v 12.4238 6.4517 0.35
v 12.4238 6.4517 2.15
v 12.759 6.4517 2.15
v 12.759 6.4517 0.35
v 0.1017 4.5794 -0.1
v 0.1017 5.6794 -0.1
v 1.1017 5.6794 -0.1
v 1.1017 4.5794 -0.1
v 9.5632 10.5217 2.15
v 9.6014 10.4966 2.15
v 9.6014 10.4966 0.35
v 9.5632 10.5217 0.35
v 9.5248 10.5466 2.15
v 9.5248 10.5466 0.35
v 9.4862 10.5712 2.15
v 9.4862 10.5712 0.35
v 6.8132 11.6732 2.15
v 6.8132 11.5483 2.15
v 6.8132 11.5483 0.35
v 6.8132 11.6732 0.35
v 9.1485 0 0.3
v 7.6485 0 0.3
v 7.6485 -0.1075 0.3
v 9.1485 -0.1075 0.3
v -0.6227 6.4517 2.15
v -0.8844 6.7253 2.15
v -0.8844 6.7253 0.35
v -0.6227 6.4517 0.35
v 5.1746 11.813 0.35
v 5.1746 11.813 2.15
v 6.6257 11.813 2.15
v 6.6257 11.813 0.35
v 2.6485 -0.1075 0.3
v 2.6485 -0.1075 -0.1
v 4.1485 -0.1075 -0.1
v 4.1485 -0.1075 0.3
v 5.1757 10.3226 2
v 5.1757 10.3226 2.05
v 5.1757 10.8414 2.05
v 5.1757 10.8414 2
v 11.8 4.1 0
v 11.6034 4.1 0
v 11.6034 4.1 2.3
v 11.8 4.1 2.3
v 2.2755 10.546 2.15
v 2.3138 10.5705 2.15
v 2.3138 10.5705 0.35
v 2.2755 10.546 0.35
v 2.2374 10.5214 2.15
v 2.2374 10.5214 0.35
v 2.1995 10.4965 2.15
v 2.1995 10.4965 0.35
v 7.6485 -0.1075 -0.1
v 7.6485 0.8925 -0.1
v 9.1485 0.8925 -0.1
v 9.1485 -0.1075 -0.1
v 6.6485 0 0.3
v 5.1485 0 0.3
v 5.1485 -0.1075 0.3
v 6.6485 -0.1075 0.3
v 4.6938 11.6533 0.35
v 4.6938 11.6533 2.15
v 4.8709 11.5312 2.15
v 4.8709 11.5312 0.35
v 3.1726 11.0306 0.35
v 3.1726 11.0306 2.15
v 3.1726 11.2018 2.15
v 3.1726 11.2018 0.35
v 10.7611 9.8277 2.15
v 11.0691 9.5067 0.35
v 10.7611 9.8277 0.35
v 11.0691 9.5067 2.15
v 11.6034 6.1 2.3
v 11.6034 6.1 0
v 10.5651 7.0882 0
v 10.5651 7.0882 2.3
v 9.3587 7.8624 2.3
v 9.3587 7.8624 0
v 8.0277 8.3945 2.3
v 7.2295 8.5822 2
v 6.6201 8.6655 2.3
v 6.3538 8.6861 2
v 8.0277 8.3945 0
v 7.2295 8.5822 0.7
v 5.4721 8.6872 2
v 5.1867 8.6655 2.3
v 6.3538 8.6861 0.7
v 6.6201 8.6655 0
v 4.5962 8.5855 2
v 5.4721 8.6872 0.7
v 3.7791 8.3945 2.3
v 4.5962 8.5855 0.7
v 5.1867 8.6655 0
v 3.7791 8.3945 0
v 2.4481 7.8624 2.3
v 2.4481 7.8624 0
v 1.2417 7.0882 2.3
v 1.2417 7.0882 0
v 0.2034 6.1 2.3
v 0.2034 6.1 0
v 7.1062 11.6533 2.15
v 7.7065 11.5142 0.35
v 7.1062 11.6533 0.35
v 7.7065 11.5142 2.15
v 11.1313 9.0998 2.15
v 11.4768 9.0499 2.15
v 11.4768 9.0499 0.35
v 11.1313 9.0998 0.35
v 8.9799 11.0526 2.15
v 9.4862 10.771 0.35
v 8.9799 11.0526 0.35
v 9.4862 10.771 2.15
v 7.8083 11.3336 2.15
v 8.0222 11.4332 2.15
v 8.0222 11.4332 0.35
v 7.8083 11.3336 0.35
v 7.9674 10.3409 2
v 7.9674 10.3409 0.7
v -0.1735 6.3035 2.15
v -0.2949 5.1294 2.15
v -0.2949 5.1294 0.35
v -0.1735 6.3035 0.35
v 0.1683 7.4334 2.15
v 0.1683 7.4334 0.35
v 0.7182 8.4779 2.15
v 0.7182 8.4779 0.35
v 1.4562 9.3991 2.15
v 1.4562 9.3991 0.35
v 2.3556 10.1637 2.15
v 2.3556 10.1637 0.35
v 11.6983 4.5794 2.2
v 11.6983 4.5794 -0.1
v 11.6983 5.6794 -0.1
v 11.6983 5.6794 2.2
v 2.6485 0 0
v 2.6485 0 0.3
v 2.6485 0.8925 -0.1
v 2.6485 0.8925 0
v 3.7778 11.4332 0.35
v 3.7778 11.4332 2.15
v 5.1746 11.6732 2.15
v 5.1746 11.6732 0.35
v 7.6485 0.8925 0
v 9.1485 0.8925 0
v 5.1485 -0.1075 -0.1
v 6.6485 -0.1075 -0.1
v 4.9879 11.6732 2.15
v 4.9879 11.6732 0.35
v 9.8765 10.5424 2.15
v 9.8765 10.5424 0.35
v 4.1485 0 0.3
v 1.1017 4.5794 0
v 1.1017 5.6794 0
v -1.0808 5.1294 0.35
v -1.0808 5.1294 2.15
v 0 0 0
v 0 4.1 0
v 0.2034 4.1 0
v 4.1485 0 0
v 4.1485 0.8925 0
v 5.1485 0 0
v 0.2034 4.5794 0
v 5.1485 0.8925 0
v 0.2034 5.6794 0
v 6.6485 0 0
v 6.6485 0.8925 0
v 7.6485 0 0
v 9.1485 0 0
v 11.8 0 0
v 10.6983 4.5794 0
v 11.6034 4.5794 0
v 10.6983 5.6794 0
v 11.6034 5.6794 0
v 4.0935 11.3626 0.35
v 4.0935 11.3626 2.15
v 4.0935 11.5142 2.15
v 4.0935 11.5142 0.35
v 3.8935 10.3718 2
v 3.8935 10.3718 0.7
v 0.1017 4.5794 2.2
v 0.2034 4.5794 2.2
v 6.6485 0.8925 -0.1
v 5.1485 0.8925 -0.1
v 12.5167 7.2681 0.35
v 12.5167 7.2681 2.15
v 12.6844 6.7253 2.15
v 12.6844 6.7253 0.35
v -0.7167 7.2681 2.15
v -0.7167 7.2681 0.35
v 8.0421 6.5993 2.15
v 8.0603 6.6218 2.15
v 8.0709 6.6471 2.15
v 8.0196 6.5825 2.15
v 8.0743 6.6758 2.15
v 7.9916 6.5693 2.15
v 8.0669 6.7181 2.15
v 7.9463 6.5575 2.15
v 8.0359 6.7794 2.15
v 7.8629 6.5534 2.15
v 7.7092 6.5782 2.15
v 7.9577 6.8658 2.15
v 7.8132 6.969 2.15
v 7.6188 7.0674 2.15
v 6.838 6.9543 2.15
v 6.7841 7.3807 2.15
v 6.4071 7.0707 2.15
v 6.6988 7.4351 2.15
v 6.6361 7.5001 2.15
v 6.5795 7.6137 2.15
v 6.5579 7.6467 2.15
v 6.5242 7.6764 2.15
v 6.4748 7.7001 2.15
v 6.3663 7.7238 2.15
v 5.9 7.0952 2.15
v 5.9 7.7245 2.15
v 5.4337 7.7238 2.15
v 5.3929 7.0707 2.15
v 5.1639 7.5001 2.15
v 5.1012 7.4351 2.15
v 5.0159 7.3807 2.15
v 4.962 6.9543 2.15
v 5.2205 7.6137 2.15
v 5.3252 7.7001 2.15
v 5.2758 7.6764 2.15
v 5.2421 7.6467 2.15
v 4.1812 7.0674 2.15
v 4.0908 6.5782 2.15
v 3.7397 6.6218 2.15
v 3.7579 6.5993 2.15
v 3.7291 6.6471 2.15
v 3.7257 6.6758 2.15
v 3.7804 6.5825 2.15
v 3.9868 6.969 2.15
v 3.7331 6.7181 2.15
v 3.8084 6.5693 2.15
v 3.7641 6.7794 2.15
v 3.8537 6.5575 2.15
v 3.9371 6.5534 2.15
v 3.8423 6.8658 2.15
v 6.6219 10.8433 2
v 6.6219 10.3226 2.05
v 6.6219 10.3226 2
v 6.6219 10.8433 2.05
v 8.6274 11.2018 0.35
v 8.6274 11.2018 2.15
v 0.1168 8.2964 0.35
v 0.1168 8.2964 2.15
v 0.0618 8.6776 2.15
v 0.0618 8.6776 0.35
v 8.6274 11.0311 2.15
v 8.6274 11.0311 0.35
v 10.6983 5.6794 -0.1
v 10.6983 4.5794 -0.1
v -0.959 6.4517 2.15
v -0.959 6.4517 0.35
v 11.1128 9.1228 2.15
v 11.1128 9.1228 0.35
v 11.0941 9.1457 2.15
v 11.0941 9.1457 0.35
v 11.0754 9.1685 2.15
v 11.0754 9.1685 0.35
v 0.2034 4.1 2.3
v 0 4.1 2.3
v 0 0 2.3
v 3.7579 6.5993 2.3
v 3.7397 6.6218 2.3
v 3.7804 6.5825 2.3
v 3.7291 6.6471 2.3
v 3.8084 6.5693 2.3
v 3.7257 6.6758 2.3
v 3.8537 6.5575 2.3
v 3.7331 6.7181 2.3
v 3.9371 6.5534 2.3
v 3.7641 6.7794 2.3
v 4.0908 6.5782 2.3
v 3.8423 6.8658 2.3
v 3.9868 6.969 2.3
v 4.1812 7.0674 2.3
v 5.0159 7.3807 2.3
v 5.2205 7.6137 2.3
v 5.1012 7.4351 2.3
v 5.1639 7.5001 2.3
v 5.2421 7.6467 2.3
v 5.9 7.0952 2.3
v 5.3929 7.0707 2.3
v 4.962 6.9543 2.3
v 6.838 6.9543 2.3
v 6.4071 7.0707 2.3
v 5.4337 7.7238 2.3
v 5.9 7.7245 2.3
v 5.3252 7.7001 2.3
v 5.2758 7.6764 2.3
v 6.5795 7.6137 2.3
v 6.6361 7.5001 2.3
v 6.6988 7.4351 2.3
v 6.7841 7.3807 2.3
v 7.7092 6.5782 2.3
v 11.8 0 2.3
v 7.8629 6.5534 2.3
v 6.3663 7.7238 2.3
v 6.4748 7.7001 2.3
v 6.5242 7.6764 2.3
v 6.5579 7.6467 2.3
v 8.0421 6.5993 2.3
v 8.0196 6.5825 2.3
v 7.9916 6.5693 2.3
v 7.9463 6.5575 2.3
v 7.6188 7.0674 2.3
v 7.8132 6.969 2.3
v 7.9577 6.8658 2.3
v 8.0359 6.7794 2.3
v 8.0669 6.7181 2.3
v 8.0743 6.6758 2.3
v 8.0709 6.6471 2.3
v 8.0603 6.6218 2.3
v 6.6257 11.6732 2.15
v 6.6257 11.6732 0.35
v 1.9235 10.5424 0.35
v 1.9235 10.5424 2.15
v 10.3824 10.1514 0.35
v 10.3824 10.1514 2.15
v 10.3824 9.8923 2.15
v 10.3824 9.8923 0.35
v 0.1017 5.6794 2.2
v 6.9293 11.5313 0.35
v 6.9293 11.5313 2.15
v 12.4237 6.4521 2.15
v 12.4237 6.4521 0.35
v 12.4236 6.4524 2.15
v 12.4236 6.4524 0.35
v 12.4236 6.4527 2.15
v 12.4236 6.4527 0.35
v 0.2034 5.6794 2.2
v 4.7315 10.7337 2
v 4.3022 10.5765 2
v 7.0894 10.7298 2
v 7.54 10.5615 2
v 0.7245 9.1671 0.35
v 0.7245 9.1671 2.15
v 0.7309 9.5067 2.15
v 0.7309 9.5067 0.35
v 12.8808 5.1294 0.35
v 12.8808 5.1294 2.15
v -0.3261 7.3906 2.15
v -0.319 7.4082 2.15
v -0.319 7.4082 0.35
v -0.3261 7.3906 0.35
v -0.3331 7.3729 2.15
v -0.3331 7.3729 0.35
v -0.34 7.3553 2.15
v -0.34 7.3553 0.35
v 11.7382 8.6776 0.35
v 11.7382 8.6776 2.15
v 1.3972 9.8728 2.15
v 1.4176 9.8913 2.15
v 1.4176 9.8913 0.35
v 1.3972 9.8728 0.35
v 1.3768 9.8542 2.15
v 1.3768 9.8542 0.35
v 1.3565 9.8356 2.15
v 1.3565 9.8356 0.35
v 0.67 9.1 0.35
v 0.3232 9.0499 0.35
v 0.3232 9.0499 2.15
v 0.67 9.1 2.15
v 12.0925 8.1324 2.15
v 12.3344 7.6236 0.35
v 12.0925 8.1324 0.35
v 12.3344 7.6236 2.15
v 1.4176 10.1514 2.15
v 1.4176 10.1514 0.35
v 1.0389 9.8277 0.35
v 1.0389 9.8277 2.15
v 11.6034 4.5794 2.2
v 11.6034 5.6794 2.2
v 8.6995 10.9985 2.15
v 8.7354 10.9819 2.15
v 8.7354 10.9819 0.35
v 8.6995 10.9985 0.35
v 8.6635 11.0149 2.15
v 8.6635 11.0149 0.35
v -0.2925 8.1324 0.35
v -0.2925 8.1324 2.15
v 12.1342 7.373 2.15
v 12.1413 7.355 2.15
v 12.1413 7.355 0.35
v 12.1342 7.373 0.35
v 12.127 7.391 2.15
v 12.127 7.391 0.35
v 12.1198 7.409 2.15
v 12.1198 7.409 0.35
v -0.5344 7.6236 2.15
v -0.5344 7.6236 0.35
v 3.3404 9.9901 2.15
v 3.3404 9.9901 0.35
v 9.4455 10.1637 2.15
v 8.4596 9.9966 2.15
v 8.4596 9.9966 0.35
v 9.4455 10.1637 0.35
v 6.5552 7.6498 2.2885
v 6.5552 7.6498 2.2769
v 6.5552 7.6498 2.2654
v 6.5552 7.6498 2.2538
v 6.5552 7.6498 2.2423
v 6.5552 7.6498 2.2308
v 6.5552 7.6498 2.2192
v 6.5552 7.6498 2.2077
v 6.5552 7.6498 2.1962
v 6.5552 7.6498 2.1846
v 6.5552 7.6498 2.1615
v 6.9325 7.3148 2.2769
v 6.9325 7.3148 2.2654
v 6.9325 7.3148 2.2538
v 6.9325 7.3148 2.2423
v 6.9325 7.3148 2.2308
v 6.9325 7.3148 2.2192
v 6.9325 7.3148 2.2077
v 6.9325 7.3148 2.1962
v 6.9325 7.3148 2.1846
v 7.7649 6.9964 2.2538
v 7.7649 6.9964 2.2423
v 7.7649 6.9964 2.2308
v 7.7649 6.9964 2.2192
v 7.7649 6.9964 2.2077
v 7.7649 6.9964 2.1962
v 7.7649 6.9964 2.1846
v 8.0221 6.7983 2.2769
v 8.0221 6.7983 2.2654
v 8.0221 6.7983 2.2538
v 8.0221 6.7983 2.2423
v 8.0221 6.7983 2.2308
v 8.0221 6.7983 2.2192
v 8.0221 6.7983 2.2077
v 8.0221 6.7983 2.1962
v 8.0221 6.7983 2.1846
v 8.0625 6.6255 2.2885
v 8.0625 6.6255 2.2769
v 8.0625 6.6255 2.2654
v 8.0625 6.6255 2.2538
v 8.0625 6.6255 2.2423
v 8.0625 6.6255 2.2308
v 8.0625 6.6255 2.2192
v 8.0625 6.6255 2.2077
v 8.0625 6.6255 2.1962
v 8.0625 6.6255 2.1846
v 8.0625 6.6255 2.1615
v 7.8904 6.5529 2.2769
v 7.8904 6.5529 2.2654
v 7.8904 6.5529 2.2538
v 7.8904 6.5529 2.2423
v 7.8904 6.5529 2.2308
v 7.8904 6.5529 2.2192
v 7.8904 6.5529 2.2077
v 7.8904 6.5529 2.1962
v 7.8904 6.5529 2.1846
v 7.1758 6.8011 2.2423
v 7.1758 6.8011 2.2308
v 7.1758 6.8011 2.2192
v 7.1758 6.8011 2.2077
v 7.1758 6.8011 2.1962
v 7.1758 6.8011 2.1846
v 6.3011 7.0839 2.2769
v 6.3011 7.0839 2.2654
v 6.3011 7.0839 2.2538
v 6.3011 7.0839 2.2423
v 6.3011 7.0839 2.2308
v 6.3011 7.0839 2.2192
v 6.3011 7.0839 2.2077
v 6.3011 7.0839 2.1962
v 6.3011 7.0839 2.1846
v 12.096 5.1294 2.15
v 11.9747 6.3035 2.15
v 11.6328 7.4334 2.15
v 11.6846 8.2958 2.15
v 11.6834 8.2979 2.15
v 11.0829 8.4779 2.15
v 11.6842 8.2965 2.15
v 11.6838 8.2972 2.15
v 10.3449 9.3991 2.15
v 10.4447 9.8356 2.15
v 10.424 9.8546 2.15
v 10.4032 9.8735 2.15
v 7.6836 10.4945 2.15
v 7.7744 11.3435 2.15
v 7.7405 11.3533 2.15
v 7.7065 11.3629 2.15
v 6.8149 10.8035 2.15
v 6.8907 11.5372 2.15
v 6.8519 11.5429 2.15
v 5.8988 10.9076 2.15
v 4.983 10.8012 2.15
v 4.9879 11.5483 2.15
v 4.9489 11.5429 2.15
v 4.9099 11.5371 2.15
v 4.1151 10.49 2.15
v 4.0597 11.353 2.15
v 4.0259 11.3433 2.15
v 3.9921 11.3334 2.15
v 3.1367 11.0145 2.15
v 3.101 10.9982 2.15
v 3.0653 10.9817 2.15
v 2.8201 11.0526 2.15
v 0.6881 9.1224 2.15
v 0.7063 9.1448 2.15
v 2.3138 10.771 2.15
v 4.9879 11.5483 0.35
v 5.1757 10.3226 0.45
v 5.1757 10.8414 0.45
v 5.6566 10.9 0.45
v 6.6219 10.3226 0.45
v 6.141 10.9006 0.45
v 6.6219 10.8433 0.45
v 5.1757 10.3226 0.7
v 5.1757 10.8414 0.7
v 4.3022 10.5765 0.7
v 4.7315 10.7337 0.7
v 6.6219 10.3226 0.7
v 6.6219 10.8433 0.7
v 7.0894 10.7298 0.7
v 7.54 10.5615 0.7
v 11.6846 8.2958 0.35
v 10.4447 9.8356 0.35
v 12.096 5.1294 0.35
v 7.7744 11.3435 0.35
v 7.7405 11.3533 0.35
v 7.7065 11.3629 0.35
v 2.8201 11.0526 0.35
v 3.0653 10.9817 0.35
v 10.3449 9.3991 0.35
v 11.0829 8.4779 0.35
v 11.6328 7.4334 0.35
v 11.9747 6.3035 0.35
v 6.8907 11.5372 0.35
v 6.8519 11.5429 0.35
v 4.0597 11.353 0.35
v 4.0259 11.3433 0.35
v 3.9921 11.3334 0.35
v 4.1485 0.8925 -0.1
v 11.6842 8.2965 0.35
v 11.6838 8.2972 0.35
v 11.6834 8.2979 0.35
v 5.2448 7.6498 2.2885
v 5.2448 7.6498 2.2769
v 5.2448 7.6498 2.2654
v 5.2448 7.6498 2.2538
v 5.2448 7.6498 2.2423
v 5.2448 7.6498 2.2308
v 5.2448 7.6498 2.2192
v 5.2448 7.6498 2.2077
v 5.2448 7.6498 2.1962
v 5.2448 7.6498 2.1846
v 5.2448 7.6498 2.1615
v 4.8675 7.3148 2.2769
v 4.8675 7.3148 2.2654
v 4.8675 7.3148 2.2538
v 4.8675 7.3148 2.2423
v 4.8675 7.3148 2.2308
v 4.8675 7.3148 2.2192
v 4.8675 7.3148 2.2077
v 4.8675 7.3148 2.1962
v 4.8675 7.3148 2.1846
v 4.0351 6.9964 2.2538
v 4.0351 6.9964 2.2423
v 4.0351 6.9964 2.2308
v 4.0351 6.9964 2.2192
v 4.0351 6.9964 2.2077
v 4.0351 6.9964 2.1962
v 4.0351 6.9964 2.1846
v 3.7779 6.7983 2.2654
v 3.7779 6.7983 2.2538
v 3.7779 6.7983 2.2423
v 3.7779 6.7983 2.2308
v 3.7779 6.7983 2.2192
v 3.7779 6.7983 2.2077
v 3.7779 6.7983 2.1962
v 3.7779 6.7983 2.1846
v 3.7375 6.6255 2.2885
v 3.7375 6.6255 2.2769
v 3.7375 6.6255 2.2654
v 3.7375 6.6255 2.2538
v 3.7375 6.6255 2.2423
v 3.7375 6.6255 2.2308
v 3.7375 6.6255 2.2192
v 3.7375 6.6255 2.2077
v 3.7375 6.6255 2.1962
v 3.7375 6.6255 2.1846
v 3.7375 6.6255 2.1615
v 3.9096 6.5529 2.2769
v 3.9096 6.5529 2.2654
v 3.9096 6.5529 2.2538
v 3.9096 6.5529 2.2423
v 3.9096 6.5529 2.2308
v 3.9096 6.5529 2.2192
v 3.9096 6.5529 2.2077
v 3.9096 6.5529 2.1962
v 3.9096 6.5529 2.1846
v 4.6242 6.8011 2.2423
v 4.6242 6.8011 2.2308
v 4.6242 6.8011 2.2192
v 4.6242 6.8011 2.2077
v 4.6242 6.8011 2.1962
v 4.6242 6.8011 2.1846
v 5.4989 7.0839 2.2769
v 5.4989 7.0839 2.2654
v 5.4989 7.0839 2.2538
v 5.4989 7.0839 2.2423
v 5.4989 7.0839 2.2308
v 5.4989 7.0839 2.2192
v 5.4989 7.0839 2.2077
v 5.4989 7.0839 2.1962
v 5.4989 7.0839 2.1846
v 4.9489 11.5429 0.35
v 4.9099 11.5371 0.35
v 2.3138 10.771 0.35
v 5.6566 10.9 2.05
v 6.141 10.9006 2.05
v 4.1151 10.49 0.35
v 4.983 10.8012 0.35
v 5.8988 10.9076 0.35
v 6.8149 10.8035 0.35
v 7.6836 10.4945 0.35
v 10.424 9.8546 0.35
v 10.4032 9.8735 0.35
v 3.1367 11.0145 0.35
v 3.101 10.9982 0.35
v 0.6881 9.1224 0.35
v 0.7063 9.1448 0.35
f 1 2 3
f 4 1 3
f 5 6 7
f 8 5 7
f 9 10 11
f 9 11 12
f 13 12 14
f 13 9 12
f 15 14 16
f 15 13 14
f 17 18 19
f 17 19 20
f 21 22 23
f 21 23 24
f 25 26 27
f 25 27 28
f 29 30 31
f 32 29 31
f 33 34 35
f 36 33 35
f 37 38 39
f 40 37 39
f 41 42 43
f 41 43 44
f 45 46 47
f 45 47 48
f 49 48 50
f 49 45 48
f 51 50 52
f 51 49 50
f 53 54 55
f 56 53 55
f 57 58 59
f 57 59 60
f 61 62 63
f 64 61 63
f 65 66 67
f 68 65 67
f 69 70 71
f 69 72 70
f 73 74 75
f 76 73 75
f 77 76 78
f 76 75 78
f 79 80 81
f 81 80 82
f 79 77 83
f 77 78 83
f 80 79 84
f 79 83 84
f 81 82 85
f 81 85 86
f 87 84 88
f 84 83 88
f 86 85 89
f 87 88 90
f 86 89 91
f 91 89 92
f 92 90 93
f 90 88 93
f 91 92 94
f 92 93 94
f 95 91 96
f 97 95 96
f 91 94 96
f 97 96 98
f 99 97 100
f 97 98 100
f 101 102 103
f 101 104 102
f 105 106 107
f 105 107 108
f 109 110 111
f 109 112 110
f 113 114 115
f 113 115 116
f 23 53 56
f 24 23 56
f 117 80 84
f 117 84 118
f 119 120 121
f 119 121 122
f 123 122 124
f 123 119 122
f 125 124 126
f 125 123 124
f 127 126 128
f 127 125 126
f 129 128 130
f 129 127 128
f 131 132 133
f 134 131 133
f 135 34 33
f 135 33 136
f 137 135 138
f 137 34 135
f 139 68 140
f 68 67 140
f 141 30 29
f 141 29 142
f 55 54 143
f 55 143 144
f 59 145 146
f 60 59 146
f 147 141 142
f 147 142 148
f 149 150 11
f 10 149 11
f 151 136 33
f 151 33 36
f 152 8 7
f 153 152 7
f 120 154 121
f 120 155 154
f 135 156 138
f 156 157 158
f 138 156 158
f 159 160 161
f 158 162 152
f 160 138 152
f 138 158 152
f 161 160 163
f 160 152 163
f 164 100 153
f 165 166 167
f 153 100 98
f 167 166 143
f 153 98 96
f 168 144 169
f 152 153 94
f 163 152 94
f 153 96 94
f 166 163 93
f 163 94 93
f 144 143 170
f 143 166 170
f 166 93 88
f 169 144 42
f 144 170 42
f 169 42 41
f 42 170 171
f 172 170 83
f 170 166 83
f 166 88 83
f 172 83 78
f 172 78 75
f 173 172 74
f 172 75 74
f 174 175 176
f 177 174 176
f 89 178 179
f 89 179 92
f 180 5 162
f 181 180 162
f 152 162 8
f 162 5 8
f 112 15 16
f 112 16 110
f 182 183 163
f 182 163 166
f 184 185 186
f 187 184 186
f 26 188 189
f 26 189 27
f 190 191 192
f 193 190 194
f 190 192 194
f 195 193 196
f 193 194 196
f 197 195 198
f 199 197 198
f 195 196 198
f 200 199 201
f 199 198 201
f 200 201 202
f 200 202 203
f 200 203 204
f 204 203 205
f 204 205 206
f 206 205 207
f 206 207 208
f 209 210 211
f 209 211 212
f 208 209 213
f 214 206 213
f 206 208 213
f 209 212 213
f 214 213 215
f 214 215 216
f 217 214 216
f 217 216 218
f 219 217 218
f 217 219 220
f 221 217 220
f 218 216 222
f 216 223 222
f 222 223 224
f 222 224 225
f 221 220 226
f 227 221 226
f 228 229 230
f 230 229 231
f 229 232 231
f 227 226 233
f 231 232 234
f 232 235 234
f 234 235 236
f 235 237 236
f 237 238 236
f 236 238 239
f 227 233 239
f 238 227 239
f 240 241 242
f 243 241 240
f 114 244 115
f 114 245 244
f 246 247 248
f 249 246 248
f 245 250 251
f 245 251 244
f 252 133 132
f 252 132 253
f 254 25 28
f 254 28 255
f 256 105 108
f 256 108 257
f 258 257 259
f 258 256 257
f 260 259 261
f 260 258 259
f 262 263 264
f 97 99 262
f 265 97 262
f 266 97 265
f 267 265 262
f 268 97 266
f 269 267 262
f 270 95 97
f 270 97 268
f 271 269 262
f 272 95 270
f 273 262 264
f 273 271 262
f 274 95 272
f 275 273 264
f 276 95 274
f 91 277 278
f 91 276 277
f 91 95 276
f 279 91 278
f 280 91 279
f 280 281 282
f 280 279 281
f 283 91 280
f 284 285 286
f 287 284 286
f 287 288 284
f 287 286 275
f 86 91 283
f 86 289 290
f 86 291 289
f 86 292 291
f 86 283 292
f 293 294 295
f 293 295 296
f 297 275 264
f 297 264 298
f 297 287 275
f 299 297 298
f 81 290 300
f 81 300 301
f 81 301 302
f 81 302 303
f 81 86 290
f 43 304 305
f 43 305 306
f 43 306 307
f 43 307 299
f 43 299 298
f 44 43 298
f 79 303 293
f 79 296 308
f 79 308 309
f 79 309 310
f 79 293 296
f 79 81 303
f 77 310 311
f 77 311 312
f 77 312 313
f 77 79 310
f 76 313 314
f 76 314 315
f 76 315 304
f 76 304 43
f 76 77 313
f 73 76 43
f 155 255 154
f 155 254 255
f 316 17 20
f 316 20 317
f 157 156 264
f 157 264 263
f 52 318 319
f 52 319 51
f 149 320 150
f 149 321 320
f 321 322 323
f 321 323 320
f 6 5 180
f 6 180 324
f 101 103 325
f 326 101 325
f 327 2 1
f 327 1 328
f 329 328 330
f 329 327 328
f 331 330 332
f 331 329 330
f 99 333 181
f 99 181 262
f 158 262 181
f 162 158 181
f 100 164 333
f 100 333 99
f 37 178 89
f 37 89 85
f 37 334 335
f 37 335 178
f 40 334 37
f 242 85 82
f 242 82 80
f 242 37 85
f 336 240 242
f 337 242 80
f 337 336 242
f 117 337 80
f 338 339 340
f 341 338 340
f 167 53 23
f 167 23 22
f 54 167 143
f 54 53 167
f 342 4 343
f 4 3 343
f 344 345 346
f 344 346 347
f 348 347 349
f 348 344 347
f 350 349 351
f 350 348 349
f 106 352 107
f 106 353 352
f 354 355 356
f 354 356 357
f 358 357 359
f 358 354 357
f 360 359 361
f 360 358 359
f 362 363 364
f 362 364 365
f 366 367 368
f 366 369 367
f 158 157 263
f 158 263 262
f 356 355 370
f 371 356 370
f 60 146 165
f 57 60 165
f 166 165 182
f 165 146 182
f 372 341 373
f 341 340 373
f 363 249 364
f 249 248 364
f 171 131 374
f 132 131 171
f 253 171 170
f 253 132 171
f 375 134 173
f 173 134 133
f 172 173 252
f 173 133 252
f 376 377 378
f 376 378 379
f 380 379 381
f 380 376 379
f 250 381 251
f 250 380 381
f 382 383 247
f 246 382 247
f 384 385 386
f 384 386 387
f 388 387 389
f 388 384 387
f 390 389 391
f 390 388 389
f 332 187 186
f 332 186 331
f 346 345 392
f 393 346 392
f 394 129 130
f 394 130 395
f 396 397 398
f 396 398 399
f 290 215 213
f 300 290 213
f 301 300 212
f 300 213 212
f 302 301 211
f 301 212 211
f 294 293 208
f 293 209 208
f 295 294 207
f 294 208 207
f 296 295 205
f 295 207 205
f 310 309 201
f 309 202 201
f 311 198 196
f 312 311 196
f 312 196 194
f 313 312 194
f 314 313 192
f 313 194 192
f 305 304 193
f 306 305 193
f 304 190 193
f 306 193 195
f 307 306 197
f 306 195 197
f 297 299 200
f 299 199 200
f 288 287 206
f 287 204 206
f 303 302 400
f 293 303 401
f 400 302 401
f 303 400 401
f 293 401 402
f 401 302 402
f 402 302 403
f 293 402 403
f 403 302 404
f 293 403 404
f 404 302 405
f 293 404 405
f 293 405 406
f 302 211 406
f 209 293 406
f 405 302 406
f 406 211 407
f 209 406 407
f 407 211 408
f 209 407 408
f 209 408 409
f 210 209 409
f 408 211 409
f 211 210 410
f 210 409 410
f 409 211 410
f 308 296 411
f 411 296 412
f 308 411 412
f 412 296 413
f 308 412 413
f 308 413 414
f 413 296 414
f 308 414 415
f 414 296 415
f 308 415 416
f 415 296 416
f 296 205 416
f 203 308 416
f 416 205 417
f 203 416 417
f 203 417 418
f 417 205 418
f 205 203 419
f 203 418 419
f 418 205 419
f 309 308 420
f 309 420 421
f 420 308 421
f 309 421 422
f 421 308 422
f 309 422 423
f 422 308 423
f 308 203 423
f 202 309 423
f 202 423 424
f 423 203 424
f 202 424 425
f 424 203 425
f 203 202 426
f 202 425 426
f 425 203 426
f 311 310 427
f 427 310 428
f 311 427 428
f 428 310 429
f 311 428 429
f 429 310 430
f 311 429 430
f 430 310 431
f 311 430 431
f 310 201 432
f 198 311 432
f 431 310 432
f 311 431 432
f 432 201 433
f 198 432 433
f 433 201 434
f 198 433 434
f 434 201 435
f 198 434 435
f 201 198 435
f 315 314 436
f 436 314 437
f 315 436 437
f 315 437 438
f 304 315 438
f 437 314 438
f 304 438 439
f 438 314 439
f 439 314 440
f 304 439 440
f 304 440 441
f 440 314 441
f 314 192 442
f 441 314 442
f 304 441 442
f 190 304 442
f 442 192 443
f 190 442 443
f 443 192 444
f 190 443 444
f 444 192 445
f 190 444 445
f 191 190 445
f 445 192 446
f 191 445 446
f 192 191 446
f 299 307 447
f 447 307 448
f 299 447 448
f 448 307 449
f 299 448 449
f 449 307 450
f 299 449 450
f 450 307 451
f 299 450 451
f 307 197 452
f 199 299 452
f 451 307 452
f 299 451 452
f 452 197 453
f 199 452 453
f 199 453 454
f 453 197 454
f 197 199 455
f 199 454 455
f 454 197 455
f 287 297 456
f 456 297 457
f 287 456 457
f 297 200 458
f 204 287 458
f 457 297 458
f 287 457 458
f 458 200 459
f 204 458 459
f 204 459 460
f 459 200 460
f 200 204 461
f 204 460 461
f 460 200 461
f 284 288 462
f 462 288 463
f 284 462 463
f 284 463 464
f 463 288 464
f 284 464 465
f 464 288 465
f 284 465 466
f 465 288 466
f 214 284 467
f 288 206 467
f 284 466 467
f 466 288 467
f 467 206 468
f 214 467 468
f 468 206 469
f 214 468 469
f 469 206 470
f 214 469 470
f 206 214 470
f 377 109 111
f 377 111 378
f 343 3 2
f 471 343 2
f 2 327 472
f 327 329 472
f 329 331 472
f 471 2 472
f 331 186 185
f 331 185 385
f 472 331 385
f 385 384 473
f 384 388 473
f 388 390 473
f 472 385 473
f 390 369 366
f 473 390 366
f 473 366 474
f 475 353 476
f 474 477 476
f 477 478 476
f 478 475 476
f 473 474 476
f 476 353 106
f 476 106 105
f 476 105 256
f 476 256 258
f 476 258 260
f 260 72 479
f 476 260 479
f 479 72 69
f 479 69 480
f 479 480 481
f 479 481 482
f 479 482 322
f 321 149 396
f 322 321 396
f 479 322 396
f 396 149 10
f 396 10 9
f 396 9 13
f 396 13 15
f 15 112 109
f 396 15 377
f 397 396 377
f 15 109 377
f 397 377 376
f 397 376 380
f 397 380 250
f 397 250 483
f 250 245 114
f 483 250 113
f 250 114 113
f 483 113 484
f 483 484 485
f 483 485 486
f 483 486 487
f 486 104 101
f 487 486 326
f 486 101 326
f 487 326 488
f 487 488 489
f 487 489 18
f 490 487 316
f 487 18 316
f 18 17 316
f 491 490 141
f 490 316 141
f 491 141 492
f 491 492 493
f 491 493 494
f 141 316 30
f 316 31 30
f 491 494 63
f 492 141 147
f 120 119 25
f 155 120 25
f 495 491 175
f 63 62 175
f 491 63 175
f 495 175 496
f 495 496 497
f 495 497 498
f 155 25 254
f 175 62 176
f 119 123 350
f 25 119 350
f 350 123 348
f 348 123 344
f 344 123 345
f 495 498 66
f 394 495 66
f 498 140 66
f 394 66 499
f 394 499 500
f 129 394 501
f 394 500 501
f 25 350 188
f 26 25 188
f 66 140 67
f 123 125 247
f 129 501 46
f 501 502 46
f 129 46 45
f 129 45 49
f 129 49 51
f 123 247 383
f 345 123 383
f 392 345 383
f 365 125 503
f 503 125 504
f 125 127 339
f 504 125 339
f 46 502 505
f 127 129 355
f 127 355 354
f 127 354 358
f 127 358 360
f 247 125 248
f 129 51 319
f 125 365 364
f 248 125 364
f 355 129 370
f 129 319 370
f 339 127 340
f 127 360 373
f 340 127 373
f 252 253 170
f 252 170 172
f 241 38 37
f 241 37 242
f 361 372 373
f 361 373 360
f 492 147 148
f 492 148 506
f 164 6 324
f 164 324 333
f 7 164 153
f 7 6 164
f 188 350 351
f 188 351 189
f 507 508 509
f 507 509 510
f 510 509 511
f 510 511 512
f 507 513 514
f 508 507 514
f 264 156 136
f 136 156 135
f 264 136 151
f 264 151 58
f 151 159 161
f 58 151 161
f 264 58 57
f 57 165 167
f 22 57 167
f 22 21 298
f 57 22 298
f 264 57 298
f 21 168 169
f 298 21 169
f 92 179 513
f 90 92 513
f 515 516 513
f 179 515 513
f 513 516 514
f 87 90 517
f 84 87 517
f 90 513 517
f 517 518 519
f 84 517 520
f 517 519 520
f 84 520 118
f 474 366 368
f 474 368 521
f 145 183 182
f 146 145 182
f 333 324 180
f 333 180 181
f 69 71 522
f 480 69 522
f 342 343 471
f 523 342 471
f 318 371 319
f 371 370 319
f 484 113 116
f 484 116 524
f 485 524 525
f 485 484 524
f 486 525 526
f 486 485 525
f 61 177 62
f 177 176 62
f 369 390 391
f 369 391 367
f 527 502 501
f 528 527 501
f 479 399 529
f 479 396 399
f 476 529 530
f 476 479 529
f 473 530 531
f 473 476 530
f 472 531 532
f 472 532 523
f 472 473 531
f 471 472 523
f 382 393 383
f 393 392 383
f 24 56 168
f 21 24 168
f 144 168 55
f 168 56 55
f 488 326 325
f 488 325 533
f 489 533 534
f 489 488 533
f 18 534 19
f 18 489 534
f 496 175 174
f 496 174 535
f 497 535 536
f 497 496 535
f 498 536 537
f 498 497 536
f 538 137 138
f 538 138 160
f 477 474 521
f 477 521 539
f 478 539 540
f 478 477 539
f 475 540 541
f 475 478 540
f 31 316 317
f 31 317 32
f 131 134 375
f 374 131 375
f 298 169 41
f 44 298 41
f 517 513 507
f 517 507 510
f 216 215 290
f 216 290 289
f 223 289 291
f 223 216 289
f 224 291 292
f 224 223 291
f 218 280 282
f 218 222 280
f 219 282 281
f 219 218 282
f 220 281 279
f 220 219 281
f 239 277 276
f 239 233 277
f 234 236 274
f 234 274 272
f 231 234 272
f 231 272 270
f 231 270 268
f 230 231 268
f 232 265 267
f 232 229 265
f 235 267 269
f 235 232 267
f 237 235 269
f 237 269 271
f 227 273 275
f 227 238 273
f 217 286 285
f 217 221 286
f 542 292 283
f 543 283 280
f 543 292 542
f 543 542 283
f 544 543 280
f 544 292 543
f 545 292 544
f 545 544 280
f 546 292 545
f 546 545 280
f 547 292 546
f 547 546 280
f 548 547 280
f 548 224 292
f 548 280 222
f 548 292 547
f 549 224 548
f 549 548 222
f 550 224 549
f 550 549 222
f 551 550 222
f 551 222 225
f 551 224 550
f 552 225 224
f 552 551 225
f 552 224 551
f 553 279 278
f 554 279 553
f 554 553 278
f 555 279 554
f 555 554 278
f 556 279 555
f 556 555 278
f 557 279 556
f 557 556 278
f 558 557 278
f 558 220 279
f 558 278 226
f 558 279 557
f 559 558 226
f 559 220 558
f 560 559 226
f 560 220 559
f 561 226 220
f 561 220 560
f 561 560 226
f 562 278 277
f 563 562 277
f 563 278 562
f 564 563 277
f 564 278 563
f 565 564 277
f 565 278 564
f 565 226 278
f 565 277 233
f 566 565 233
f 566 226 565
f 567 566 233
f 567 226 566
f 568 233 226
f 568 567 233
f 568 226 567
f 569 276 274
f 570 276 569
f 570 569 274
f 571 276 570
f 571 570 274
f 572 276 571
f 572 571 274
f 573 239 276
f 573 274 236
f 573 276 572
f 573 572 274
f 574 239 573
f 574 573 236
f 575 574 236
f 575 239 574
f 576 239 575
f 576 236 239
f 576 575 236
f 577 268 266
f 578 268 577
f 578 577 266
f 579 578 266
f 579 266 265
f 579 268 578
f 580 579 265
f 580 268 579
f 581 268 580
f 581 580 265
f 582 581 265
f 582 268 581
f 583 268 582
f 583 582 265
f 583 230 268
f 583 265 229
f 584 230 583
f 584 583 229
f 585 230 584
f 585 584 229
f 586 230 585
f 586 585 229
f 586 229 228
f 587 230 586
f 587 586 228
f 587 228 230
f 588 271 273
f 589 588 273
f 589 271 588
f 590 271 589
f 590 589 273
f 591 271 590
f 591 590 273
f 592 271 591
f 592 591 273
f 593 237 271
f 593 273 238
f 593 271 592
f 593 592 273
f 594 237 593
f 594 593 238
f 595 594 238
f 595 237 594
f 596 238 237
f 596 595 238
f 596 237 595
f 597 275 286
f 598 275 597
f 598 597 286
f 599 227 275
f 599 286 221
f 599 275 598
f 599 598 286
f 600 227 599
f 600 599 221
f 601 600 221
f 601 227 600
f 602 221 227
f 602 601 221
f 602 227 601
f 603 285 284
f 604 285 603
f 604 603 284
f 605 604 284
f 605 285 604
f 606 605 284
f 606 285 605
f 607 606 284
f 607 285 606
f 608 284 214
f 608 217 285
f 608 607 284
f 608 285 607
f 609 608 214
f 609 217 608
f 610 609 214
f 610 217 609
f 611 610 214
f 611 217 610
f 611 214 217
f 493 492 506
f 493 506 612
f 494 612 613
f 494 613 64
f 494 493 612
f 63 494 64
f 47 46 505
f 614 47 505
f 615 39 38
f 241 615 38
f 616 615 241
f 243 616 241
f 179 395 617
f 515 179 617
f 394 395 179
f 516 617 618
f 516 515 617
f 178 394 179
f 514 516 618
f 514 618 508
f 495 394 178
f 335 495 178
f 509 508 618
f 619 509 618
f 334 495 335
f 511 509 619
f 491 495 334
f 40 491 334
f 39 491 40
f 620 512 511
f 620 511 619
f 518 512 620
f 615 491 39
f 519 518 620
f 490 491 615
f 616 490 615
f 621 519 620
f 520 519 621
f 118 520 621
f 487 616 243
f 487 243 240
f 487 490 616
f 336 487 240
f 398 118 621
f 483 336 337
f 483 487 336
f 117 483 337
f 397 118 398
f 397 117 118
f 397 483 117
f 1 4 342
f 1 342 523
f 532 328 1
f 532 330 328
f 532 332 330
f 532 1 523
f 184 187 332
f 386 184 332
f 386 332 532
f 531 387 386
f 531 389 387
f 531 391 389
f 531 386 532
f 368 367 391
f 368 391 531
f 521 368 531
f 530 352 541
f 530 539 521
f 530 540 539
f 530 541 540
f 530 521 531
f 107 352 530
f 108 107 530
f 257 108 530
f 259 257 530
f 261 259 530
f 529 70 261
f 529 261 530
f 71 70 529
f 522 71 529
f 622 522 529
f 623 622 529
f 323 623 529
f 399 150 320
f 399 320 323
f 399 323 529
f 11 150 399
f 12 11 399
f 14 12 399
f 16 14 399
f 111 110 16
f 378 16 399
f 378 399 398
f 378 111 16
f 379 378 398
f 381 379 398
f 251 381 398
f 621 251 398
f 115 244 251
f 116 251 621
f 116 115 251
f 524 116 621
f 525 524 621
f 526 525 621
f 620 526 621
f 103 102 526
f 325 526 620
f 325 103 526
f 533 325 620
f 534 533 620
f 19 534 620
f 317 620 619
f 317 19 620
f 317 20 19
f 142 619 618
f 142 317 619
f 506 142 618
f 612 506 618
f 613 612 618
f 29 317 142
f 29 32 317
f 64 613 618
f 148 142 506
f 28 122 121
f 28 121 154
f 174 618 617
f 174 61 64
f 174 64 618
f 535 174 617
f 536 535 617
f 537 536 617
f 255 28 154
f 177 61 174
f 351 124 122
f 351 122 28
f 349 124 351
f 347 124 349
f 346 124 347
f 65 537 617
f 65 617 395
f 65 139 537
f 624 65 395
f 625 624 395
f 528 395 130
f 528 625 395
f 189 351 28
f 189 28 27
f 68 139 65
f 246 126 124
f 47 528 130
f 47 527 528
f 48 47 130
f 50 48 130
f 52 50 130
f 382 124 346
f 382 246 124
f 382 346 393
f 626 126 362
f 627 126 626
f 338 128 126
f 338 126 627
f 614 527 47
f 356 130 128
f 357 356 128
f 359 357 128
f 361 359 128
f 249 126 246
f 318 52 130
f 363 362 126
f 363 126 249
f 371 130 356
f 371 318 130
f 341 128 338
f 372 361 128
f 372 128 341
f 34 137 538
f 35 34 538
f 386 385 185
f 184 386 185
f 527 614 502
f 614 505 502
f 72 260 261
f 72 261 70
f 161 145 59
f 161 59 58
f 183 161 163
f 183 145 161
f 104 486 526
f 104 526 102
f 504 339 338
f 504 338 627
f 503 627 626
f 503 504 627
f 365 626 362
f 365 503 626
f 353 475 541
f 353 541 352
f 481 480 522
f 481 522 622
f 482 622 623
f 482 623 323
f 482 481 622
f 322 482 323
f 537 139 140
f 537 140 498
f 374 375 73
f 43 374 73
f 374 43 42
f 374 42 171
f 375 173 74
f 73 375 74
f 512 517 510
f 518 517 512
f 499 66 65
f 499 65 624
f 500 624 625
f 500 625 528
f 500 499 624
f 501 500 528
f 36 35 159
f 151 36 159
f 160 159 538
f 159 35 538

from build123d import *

# Parameters (mm, degrees)
SKETCH1_W            = 11.8
SKETCH1_H            = 4.1
BOSS_EXTRUDE1_DEPTH  = 2.3
SKETCH2_W            = 11.4
SKETCH2_H            = 2
BOSS_EXTRUDE2_DEPTH  = 2.3
BOSS_EXTRUDE3_START  = -0.1
SKETCH3_W            = 1
SKETCH3_H            = 1.1
BOSS_EXTRUDE3_DEPTH  = 2.3
BOSS_EXTRUDE4_START  = -0.1
SKETCH4_W            = 1.5
SKETCH4_H            = 1
BOSS_EXTRUDE4_DEPTH  = 0.4
LPATTERN1_COUNT      = 2
LPATTERN1_PITCH      = 2.5
LPATTERN1_COL_COUNT  = 2
LPATTERN1_COL_PITCH  = 2.5
BOSS_EXTRUDE5_DEPTH  = 2.3
CUT_EXTRUDE1_START   = 2.15
CUT_EXTRUDE1_DEPTH   = 0.15
BOSS_EXTRUDE6_START  = 0.1
SKETCH9_W            = 1.451153264
SKETCH9_H            = 0.139855477
SKETCH9_H_2          = 0.01502842
BOSS_EXTRUDE6_DEPTH  = 0.9
BOSS_EXTRUDE7_START  = 0.2
BOSS_EXTRUDE7_DEPTH  = 0.65
BOSS_EXTRUDE8_START  = 0.1
SKETCH12_W           = 1.44617415
SKETCH12_H           = 1.169902142
BOSS_EXTRUDE8_DEPTH  = 0.8
BOSS_EXTRUDE9_START  = 0.1
BOSS_EXTRUDE9_DEPTH  = 0.9
BOSS_EXTRUDE11_START = 0.1
BOSS_EXTRUDE11_DEPTH = 0.9


# Read off the part's stored shape, not the designer's step: Cut-Extrude1
with BuildPart() as part:
    # Sketch1 → Boss-Extrude1 (new body)
    with BuildSketch(Plane.XY):
        with Locations((5.9, 2.05)):
            Rectangle(SKETCH1_W, SKETCH1_H)
    extrude(amount=BOSS_EXTRUDE1_DEPTH)

    # Sketch2 → Boss-Extrude2 (add)
    with BuildSketch(Plane.XY):
        with Locations((5.903416876, 5.1)):
            Rectangle(SKETCH2_W, SKETCH2_H)
    extrude(amount=BOSS_EXTRUDE2_DEPTH)

    # Sketch3 → Boss-Extrude3 (add)
    with BuildSketch(Plane.XY.offset(BOSS_EXTRUDE3_START)):
        with Locations((0.601708438, 5.129355756)):
            Rectangle(SKETCH3_W, SKETCH3_H)
    boss_extrude3 = extrude(amount=BOSS_EXTRUDE3_DEPTH)

    # Mirror1: Boss-Extrude3 across plane
    add(boss_extrude3.mirror(Plane(origin=(5.9, 0, 0), x_dir=(0, 0, 1), z_dir=(1, 0, 0))))

    # Sketch4 → Boss-Extrude4 (add)
    with BuildSketch(Plane.XY.offset(BOSS_EXTRUDE4_START)):
        with Locations((5.898460375, 0.392479358)):
            Rectangle(SKETCH4_W, SKETCH4_H)
    boss_extrude4 = extrude(amount=BOSS_EXTRUDE4_DEPTH)

    # LPattern1: Boss-Extrude4 ×2
    with Locations(*[(i * LPATTERN1_PITCH, 0, 0) for i in range(1, LPATTERN1_COUNT)]):
        add(boss_extrude4)

    # LPattern1 col: Boss-Extrude4 ×2
    with Locations(*[(-i * LPATTERN1_COL_PITCH, 0, 0) for i in range(1, LPATTERN1_COL_COUNT)]):
        add(boss_extrude4)

    # Sketch7 → Boss-Extrude5 (add)
    with BuildSketch(Plane.XY):
        with BuildLine():
            Line((0.203416876, 6.1), (11.603416876, 6.1))
            ThreePointArc((11.603416876, 6.1), (5.903416876, 8.699567422), (0.203416876, 6.1))
        make_face()
    extrude(amount=BOSS_EXTRUDE5_DEPTH)

    # Cut-Extrude1 outline → Cut-Extrude1 (cut)
    with BuildSketch(Plane.XY.offset(CUT_EXTRUDE1_START)):
        with BuildLine():
            Line((5.9, 7.095183964), (5.9, 7.724501792))
            add(Edge.make_bspline(
                [(5.9, 7.724501792), (4.326937108, 7.822520939), (5.9, 7.319656572), (5.448711465, 7.255186781), (4.069057945, 7.229398865), (3.669345243, 7.087565325), (3.869201594, 7.158482095), (2.225221932, 6.120518466), (4.455876689, 6.146306382), (3.954545764, 6.281675552), (4.752437726, 7.113353242), (4.855589391, 7.061777409), (5.620353503, 7.110533179), (5.9, 7.095183964)],
                knots=[0, 0, 0, 0, 0, 0, 0, 0, 0, 0, 0, 0, 0, 0, 1, 1, 1, 1, 1, 1, 1, 1, 1, 1, 1, 1, 1, 1], degree=13))
        make_face()
    cut_extrude1 = extrude(amount=CUT_EXTRUDE1_DEPTH, mode=Mode.SUBTRACT)

    # Mirror2: Cut-Extrude1 across plane
    add(cut_extrude1.mirror(Plane(origin=(5.9, 0, 0), x_dir=(0, 0, 1), z_dir=(1, 0, 0))), mode=Mode.SUBTRACT)



with BuildPart() as body_2:
    # Sketch9 → Boss-Extrude6 (new, symmetric)
    with BuildSketch(Plane.XY.offset(1.15).offset(BOSS_EXTRUDE6_START)):
        with BuildLine():
            Line((2.355610817, 10.163701862), (3.34041857, 9.990053684))
            ThreePointArc((3.34041857, 9.990053684), (5.898836859, 10.90755899), (8.459580179, 9.996562953))
            Line((8.459580179, 9.996562953), (9.445513537, 10.163701862))
            ThreePointArc((9.445513537, 10.163701862), (5.900562177, 11.27807609), (2.355610817, 10.163701862))
        make_face()
        with BuildLine():
            ThreePointArc((-0.294894362, 5.129355756), (0.418313853, 7.968760684), (2.355610817, 10.163701862))
            ThreePointArc((2.355610817, 10.163701862), (5.900562177, 11.27807609), (9.445513537, 10.163701862))
            ThreePointArc((9.445513537, 10.163701862), (11.3828105, 7.968760684), (12.096018715, 5.129355756))
            Line((12.096018715, 5.129355756), (12.600483369, 5.129355756))
            ThreePointArc((12.600483369, 5.129355756), (10.879374358, 9.395993369), (6.813193458, 11.548337589))
            Line((6.813193458, 11.548337589), (6.625730117, 11.548337589))
            Line((6.625730117, 11.548337589), (6.625730117, 11.533309169))
            Line((6.625730117, 11.533309169), (5.174576853, 11.533309169))
            Line((5.174576853, 11.533309169), (5.174576853, 11.548337589))
            Line((5.174576853, 11.548337589), (4.987930896, 11.548337589))
            ThreePointArc((4.987930896, 11.548337589), (0.921749996, 9.395993369), (-0.799359016, 5.129355756))
            Line((-0.799359016, 5.129355756), (-0.294894362, 5.129355756))
        make_face()
        with Locations((5.900153485, 11.743092386)):
            Rectangle(SKETCH9_W, SKETCH9_H)
        with BuildLine():
            Line((5.174576853, 11.673164647), (5.174576853, 11.571323885))
            ThreePointArc((5.174576853, 11.571323885), (5.90015107, 11.610751105), (6.625730117, 11.571412879))
            Line((6.625730117, 11.571412879), (6.625730117, 11.673164647))
            Line((6.625730117, 11.673164647), (5.174576853, 11.673164647))
        make_face()
        with BuildLine():
            ThreePointArc((6.625730117, 11.571412879), (6.719543062, 11.560535503), (6.813193458, 11.548337589))
            Line((6.813193458, 11.548337589), (6.813193458, 11.673164647))
            Line((6.813193458, 11.673164647), (6.625730117, 11.673164647))
            Line((6.625730117, 11.673164647), (6.625730117, 11.571412879))
        make_face()
        with BuildLine():
            Line((4.987930896, 11.673164647), (4.987930896, 11.548337589))
            ThreePointArc((4.987930896, 11.548337589), (5.081173266, 11.560485266), (5.174576853, 11.571323885))
            Line((5.174576853, 11.571323885), (5.174576853, 11.673164647))
            Line((5.174576853, 11.673164647), (4.987930896, 11.673164647))
        make_face()
        with BuildLine():
            Line((5.174576853, 11.571323885), (5.174576853, 11.548337589))
            Line((5.174576853, 11.548337589), (6.625730117, 11.548337589))
            Line((6.625730117, 11.548337589), (6.625730117, 11.571412879))
            ThreePointArc((6.625730117, 11.571412879), (5.90015107, 11.610751105), (5.174576853, 11.571323885))
        make_face()
        with BuildLine():
            ThreePointArc((5.174576853, 11.571323885), (5.081173266, 11.560485266), (4.987930896, 11.548337589))
            Line((4.987930896, 11.548337589), (5.174576853, 11.548337589))
            Line((5.174576853, 11.548337589), (5.174576853, 11.571323885))
        make_face()
        with Locations((5.900153485, 11.540823379)):
            Rectangle(SKETCH9_W, SKETCH9_H_2)
        with BuildLine():
            Line((6.625730117, 11.548337589), (6.813193458, 11.548337589))
            ThreePointArc((6.813193458, 11.548337589), (6.719543062, 11.560535503), (6.625730117, 11.571412879))
            Line((6.625730117, 11.571412879), (6.625730117, 11.548337589))
        make_face()
    extrude(amount=BOSS_EXTRUDE6_DEPTH, both=True)



with BuildPart() as body_3:
    # Sketch11 → Boss-Extrude7 (new, symmetric)
    with BuildSketch(Plane.XY.offset(1.15).offset(BOSS_EXTRUDE7_START)):
        Polygon((8.224851185, 10.954397565), (5.972117123, 10.954397565), (3.66431816, 10.954397565), (4.823471696, 8.00789138), (5.903471696, 8.00789138), (6.988471696, 8.00789138), align=None)
    extrude(amount=BOSS_EXTRUDE7_DEPTH, both=True)


with BuildPart() as body_2_1:
    add(body_2.part)

    add(body_3.part)  # Boss-Extrude8 merges body 3
    # Sketch12 → Boss-Extrude8 (add, symmetric)
    with BuildSketch(Plane.XY.offset(1.15).offset(BOSS_EXTRUDE8_START)):
        with Locations((5.898836859, 10.90755899)):
            Rectangle(SKETCH12_W, SKETCH12_H)
    extrude(amount=BOSS_EXTRUDE8_DEPTH, both=True)

    # Sketch13 → Boss-Extrude9 (add, symmetric)
    with BuildSketch(Plane.XY.offset(1.15).offset(BOSS_EXTRUDE9_START)):
        Polygon((-1.08075819, 5.129355756), (-0.799359016, 5.129355756), (-0.671141909, 6.202084295), (-0.605509207, 6.451748475), (-0.958965207, 6.451748475), align=None)
    boss_extrude9 = extrude(amount=BOSS_EXTRUDE9_DEPTH, both=True)

    # Mirror3: Boss-Extrude9 across plane
    add(boss_extrude9.mirror(Plane(origin=(5.9, 0, 0), x_dir=(0, 0, 1), z_dir=(1, 0, 0))))


with BuildPart() as part_1:
    add(part.part)

    add(body_2_1.part)  # Boss-Extrude11 merges body 2
    # Sketch14 → Boss-Extrude11 (add, symmetric)
    with BuildSketch(Plane.XY.offset(1.15).offset(BOSS_EXTRUDE11_START)):
        Polygon((4.09350701, 11.514168222), (4.693813808, 11.65328598), (4.987930896, 11.450470962), (4.09350701, 11.286137141), align=None)
        Polygon((3.172552888, 11.201783695), (3.777829994, 11.433223707), (4.09350701, 11.286137141), (3.172552888, 10.950622256), align=None)
        Polygon((2.313751368, 10.77100106), (2.820138748, 11.052647163), (3.172552888, 10.950622256), (2.313751368, 10.477435247), align=None)
        Polygon((1.417632483, 10.151446182), (1.92347576, 10.542406597), (2.313751368, 10.477435247), (1.417632483, 9.837098648), align=None)
        Polygon((0.730905136, 9.506715824), (1.038871241, 9.827727461), (1.417632483, 9.837098648), (0.723421169, 9.107663948), align=None)
        Polygon((0.061798131, 8.677620181), (0.323212614, 9.049883319), (0.723421169, 9.107663948), (0.116840619, 8.296376932), align=None)
        Polygon((-0.534407657, 7.623618076), (-0.292532583, 8.132380345), (0.116840619, 8.296376932), (-0.279961599, 7.369172018), align=None)
        Polygon((-0.279961599, 7.369172018), (-0.716747876, 7.268090769), (-0.884396434, 6.725317521), (-0.622667426, 6.451748475), align=None)
    boss_extrude11 = extrude(amount=BOSS_EXTRUDE11_DEPTH, both=True)

    # Mirror4: Boss-Extrude11 across plane
    add(boss_extrude11.mirror(Plane(origin=(5.9, 0, 0), x_dir=(0, 0, 1), z_dir=(1, 0, 0))))


solid = part_1.part
